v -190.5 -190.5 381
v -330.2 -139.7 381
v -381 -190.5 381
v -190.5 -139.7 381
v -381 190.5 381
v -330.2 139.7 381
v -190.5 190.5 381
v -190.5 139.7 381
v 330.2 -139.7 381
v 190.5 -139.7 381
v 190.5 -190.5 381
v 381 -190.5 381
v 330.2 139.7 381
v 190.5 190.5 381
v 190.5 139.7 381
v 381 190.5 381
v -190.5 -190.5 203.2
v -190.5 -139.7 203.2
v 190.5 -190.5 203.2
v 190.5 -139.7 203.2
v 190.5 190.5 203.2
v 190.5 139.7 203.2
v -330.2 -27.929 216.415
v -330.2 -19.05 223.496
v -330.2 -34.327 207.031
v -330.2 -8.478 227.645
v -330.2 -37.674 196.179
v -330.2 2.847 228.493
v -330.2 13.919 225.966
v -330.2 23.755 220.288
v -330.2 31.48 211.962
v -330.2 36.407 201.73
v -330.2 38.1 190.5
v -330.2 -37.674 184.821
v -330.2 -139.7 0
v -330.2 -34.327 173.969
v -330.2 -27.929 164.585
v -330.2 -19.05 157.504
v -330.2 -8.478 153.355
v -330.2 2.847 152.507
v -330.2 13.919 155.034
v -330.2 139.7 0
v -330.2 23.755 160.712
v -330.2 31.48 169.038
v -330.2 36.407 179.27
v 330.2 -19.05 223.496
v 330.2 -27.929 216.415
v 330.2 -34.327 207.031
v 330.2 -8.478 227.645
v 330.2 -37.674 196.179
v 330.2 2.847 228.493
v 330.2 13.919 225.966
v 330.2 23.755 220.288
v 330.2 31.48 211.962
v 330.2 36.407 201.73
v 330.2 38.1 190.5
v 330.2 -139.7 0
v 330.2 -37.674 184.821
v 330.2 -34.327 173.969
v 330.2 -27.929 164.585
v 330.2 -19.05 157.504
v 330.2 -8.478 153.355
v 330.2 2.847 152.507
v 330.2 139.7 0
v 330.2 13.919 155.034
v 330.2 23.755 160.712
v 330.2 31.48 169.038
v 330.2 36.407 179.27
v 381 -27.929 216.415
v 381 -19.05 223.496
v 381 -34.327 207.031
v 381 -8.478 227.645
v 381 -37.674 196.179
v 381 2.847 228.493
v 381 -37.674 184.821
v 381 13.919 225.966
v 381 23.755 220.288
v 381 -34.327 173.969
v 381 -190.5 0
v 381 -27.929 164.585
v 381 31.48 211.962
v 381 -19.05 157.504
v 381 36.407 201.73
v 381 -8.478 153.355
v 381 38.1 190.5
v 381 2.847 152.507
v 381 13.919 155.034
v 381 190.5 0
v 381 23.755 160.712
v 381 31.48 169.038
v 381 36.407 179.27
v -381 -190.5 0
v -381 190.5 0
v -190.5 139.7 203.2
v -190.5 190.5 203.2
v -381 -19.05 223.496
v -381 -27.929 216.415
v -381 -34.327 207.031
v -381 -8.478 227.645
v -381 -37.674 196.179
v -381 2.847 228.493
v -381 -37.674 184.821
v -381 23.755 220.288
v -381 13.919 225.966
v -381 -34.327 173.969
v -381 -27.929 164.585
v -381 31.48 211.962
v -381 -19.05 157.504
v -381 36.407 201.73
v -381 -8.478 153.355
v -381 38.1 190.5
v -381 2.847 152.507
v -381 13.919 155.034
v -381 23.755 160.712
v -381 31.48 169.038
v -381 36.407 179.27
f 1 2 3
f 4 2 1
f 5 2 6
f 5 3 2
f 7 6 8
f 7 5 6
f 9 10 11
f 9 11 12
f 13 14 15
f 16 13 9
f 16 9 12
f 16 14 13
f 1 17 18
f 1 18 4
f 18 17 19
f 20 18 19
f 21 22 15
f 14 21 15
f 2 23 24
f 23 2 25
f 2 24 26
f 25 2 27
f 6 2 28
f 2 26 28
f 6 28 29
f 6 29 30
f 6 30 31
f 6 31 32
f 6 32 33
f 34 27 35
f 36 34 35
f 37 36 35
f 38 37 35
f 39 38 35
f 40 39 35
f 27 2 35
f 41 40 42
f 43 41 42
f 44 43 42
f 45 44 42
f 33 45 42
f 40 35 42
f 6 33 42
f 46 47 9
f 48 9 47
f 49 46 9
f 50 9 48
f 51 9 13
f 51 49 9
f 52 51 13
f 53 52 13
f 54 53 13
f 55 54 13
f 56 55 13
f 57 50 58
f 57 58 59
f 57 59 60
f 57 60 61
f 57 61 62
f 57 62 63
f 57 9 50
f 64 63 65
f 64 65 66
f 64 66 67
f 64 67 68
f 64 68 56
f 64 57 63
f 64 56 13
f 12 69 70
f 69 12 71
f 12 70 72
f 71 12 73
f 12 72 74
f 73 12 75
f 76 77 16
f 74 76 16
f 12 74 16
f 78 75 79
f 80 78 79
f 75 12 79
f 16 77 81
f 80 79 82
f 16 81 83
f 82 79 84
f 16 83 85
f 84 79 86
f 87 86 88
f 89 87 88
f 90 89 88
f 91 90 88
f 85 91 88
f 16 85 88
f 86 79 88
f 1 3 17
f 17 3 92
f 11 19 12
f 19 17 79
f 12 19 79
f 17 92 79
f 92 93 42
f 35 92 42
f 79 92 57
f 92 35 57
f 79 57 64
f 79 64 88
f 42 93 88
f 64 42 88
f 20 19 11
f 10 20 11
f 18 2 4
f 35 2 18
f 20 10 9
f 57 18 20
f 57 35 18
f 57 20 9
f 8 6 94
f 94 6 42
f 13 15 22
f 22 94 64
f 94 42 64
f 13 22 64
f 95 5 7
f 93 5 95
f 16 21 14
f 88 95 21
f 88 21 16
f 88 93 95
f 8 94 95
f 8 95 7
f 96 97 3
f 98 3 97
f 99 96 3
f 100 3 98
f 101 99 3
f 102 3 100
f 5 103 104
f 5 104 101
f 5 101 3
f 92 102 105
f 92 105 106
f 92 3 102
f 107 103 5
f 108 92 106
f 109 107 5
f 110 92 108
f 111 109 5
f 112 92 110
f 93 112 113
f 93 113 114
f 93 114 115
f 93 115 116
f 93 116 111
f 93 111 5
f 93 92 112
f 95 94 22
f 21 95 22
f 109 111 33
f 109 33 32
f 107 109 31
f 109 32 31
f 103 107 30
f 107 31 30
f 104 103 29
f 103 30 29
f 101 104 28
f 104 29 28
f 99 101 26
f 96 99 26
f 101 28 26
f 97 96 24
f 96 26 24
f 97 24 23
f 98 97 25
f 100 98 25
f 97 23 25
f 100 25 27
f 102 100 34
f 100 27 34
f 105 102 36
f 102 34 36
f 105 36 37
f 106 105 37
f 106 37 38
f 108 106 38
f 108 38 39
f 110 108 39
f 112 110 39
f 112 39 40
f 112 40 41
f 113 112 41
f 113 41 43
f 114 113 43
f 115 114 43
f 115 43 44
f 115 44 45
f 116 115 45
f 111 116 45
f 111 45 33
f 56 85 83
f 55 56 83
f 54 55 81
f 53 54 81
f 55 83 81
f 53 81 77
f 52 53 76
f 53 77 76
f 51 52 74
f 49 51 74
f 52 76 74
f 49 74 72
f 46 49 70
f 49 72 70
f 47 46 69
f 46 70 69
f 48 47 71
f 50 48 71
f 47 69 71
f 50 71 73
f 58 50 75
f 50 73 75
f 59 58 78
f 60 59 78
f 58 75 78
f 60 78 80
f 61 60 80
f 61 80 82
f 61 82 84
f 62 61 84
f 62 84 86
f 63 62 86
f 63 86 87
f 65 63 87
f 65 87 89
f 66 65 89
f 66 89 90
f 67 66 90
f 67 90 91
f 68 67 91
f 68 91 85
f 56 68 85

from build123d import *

# Parameters (mm, degrees)
F0_W     = 762
F0_H     = 381
F0_W_2   = 660.4
F0_H_2   = 279.4
F1_DEPTH = 381
F2_W     = 381
F2_H     = 177.8
F3_DEPTH = 1270
F4_R     = 38.1
F5_DEPTH = 1270


with BuildPart() as f1:
    # F0 (on Top) → F1 (new body)
    with BuildSketch(Plane.XY):
        Rectangle(F0_W, F0_H)
        Rectangle(F0_W_2, F0_H_2, mode=Mode.SUBTRACT)
    extrude(amount=F1_DEPTH)

    # F2 (on face) → F3 (cut)
    with BuildSketch(Plane.XZ.offset(190.5)):
        with Locations((0, 292.1)):
            Rectangle(F2_W, F2_H)
    extrude(amount=-F3_DEPTH, mode=Mode.SUBTRACT)

    # F4 (on face) → F5 (cut)
    with BuildSketch(Plane.YZ.offset(381)):
        with Locations((0, 190.5)):
            Circle(F4_R)
    extrude(amount=-F5_DEPTH, mode=Mode.SUBTRACT)


solid = f1.part
